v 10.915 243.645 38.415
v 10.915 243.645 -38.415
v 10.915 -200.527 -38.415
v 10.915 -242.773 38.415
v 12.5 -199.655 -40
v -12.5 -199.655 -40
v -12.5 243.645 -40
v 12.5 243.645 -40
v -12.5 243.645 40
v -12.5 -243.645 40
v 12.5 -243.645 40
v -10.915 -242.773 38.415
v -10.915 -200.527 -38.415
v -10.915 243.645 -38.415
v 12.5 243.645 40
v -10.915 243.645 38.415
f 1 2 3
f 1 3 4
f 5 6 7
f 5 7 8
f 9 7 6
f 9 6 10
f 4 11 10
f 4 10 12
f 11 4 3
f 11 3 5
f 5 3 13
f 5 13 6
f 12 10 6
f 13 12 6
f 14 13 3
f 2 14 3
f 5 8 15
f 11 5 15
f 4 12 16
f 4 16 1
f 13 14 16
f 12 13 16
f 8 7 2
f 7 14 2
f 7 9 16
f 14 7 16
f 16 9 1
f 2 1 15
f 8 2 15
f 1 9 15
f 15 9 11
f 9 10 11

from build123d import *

# Parameters (mm, degrees)
F0_W        = 25
F0_H        = 80
F0_W_2      = 21.83
F0_H_2      = 76.83
F1_DEPTH    = 243.645
F2_T1_DEPTH = 439.0919651514


# Not quite as in the source:
# - a fillet or chamfer that OpenCascade refuses, or shapes differently, is made with other operations: its cross-section is extruded or revolved along the edge and cut away or added


with BuildPart() as f1:
    # F0 (on Front) → F1 (new body, symmetric)
    with BuildSketch(Plane.XZ):
        Rectangle(F0_W, F0_H)
        Rectangle(F0_W_2, F0_H_2, mode=Mode.SUBTRACT)
    extrude(amount=F1_DEPTH, both=True)

    # F2: chamfer of 80 x 43.99 on 1 edges, made by hand

    # F2_s2 → F2_t1 (cut)
    with BuildSketch(Plane.YZ.offset(-219.5459825757)):
        Polygon((-243.645, 40), (-199.655, -40), (-243.645, -40), align=None)
    extrude(amount=F2_T1_DEPTH, mode=Mode.SUBTRACT)


solid = f1.part
